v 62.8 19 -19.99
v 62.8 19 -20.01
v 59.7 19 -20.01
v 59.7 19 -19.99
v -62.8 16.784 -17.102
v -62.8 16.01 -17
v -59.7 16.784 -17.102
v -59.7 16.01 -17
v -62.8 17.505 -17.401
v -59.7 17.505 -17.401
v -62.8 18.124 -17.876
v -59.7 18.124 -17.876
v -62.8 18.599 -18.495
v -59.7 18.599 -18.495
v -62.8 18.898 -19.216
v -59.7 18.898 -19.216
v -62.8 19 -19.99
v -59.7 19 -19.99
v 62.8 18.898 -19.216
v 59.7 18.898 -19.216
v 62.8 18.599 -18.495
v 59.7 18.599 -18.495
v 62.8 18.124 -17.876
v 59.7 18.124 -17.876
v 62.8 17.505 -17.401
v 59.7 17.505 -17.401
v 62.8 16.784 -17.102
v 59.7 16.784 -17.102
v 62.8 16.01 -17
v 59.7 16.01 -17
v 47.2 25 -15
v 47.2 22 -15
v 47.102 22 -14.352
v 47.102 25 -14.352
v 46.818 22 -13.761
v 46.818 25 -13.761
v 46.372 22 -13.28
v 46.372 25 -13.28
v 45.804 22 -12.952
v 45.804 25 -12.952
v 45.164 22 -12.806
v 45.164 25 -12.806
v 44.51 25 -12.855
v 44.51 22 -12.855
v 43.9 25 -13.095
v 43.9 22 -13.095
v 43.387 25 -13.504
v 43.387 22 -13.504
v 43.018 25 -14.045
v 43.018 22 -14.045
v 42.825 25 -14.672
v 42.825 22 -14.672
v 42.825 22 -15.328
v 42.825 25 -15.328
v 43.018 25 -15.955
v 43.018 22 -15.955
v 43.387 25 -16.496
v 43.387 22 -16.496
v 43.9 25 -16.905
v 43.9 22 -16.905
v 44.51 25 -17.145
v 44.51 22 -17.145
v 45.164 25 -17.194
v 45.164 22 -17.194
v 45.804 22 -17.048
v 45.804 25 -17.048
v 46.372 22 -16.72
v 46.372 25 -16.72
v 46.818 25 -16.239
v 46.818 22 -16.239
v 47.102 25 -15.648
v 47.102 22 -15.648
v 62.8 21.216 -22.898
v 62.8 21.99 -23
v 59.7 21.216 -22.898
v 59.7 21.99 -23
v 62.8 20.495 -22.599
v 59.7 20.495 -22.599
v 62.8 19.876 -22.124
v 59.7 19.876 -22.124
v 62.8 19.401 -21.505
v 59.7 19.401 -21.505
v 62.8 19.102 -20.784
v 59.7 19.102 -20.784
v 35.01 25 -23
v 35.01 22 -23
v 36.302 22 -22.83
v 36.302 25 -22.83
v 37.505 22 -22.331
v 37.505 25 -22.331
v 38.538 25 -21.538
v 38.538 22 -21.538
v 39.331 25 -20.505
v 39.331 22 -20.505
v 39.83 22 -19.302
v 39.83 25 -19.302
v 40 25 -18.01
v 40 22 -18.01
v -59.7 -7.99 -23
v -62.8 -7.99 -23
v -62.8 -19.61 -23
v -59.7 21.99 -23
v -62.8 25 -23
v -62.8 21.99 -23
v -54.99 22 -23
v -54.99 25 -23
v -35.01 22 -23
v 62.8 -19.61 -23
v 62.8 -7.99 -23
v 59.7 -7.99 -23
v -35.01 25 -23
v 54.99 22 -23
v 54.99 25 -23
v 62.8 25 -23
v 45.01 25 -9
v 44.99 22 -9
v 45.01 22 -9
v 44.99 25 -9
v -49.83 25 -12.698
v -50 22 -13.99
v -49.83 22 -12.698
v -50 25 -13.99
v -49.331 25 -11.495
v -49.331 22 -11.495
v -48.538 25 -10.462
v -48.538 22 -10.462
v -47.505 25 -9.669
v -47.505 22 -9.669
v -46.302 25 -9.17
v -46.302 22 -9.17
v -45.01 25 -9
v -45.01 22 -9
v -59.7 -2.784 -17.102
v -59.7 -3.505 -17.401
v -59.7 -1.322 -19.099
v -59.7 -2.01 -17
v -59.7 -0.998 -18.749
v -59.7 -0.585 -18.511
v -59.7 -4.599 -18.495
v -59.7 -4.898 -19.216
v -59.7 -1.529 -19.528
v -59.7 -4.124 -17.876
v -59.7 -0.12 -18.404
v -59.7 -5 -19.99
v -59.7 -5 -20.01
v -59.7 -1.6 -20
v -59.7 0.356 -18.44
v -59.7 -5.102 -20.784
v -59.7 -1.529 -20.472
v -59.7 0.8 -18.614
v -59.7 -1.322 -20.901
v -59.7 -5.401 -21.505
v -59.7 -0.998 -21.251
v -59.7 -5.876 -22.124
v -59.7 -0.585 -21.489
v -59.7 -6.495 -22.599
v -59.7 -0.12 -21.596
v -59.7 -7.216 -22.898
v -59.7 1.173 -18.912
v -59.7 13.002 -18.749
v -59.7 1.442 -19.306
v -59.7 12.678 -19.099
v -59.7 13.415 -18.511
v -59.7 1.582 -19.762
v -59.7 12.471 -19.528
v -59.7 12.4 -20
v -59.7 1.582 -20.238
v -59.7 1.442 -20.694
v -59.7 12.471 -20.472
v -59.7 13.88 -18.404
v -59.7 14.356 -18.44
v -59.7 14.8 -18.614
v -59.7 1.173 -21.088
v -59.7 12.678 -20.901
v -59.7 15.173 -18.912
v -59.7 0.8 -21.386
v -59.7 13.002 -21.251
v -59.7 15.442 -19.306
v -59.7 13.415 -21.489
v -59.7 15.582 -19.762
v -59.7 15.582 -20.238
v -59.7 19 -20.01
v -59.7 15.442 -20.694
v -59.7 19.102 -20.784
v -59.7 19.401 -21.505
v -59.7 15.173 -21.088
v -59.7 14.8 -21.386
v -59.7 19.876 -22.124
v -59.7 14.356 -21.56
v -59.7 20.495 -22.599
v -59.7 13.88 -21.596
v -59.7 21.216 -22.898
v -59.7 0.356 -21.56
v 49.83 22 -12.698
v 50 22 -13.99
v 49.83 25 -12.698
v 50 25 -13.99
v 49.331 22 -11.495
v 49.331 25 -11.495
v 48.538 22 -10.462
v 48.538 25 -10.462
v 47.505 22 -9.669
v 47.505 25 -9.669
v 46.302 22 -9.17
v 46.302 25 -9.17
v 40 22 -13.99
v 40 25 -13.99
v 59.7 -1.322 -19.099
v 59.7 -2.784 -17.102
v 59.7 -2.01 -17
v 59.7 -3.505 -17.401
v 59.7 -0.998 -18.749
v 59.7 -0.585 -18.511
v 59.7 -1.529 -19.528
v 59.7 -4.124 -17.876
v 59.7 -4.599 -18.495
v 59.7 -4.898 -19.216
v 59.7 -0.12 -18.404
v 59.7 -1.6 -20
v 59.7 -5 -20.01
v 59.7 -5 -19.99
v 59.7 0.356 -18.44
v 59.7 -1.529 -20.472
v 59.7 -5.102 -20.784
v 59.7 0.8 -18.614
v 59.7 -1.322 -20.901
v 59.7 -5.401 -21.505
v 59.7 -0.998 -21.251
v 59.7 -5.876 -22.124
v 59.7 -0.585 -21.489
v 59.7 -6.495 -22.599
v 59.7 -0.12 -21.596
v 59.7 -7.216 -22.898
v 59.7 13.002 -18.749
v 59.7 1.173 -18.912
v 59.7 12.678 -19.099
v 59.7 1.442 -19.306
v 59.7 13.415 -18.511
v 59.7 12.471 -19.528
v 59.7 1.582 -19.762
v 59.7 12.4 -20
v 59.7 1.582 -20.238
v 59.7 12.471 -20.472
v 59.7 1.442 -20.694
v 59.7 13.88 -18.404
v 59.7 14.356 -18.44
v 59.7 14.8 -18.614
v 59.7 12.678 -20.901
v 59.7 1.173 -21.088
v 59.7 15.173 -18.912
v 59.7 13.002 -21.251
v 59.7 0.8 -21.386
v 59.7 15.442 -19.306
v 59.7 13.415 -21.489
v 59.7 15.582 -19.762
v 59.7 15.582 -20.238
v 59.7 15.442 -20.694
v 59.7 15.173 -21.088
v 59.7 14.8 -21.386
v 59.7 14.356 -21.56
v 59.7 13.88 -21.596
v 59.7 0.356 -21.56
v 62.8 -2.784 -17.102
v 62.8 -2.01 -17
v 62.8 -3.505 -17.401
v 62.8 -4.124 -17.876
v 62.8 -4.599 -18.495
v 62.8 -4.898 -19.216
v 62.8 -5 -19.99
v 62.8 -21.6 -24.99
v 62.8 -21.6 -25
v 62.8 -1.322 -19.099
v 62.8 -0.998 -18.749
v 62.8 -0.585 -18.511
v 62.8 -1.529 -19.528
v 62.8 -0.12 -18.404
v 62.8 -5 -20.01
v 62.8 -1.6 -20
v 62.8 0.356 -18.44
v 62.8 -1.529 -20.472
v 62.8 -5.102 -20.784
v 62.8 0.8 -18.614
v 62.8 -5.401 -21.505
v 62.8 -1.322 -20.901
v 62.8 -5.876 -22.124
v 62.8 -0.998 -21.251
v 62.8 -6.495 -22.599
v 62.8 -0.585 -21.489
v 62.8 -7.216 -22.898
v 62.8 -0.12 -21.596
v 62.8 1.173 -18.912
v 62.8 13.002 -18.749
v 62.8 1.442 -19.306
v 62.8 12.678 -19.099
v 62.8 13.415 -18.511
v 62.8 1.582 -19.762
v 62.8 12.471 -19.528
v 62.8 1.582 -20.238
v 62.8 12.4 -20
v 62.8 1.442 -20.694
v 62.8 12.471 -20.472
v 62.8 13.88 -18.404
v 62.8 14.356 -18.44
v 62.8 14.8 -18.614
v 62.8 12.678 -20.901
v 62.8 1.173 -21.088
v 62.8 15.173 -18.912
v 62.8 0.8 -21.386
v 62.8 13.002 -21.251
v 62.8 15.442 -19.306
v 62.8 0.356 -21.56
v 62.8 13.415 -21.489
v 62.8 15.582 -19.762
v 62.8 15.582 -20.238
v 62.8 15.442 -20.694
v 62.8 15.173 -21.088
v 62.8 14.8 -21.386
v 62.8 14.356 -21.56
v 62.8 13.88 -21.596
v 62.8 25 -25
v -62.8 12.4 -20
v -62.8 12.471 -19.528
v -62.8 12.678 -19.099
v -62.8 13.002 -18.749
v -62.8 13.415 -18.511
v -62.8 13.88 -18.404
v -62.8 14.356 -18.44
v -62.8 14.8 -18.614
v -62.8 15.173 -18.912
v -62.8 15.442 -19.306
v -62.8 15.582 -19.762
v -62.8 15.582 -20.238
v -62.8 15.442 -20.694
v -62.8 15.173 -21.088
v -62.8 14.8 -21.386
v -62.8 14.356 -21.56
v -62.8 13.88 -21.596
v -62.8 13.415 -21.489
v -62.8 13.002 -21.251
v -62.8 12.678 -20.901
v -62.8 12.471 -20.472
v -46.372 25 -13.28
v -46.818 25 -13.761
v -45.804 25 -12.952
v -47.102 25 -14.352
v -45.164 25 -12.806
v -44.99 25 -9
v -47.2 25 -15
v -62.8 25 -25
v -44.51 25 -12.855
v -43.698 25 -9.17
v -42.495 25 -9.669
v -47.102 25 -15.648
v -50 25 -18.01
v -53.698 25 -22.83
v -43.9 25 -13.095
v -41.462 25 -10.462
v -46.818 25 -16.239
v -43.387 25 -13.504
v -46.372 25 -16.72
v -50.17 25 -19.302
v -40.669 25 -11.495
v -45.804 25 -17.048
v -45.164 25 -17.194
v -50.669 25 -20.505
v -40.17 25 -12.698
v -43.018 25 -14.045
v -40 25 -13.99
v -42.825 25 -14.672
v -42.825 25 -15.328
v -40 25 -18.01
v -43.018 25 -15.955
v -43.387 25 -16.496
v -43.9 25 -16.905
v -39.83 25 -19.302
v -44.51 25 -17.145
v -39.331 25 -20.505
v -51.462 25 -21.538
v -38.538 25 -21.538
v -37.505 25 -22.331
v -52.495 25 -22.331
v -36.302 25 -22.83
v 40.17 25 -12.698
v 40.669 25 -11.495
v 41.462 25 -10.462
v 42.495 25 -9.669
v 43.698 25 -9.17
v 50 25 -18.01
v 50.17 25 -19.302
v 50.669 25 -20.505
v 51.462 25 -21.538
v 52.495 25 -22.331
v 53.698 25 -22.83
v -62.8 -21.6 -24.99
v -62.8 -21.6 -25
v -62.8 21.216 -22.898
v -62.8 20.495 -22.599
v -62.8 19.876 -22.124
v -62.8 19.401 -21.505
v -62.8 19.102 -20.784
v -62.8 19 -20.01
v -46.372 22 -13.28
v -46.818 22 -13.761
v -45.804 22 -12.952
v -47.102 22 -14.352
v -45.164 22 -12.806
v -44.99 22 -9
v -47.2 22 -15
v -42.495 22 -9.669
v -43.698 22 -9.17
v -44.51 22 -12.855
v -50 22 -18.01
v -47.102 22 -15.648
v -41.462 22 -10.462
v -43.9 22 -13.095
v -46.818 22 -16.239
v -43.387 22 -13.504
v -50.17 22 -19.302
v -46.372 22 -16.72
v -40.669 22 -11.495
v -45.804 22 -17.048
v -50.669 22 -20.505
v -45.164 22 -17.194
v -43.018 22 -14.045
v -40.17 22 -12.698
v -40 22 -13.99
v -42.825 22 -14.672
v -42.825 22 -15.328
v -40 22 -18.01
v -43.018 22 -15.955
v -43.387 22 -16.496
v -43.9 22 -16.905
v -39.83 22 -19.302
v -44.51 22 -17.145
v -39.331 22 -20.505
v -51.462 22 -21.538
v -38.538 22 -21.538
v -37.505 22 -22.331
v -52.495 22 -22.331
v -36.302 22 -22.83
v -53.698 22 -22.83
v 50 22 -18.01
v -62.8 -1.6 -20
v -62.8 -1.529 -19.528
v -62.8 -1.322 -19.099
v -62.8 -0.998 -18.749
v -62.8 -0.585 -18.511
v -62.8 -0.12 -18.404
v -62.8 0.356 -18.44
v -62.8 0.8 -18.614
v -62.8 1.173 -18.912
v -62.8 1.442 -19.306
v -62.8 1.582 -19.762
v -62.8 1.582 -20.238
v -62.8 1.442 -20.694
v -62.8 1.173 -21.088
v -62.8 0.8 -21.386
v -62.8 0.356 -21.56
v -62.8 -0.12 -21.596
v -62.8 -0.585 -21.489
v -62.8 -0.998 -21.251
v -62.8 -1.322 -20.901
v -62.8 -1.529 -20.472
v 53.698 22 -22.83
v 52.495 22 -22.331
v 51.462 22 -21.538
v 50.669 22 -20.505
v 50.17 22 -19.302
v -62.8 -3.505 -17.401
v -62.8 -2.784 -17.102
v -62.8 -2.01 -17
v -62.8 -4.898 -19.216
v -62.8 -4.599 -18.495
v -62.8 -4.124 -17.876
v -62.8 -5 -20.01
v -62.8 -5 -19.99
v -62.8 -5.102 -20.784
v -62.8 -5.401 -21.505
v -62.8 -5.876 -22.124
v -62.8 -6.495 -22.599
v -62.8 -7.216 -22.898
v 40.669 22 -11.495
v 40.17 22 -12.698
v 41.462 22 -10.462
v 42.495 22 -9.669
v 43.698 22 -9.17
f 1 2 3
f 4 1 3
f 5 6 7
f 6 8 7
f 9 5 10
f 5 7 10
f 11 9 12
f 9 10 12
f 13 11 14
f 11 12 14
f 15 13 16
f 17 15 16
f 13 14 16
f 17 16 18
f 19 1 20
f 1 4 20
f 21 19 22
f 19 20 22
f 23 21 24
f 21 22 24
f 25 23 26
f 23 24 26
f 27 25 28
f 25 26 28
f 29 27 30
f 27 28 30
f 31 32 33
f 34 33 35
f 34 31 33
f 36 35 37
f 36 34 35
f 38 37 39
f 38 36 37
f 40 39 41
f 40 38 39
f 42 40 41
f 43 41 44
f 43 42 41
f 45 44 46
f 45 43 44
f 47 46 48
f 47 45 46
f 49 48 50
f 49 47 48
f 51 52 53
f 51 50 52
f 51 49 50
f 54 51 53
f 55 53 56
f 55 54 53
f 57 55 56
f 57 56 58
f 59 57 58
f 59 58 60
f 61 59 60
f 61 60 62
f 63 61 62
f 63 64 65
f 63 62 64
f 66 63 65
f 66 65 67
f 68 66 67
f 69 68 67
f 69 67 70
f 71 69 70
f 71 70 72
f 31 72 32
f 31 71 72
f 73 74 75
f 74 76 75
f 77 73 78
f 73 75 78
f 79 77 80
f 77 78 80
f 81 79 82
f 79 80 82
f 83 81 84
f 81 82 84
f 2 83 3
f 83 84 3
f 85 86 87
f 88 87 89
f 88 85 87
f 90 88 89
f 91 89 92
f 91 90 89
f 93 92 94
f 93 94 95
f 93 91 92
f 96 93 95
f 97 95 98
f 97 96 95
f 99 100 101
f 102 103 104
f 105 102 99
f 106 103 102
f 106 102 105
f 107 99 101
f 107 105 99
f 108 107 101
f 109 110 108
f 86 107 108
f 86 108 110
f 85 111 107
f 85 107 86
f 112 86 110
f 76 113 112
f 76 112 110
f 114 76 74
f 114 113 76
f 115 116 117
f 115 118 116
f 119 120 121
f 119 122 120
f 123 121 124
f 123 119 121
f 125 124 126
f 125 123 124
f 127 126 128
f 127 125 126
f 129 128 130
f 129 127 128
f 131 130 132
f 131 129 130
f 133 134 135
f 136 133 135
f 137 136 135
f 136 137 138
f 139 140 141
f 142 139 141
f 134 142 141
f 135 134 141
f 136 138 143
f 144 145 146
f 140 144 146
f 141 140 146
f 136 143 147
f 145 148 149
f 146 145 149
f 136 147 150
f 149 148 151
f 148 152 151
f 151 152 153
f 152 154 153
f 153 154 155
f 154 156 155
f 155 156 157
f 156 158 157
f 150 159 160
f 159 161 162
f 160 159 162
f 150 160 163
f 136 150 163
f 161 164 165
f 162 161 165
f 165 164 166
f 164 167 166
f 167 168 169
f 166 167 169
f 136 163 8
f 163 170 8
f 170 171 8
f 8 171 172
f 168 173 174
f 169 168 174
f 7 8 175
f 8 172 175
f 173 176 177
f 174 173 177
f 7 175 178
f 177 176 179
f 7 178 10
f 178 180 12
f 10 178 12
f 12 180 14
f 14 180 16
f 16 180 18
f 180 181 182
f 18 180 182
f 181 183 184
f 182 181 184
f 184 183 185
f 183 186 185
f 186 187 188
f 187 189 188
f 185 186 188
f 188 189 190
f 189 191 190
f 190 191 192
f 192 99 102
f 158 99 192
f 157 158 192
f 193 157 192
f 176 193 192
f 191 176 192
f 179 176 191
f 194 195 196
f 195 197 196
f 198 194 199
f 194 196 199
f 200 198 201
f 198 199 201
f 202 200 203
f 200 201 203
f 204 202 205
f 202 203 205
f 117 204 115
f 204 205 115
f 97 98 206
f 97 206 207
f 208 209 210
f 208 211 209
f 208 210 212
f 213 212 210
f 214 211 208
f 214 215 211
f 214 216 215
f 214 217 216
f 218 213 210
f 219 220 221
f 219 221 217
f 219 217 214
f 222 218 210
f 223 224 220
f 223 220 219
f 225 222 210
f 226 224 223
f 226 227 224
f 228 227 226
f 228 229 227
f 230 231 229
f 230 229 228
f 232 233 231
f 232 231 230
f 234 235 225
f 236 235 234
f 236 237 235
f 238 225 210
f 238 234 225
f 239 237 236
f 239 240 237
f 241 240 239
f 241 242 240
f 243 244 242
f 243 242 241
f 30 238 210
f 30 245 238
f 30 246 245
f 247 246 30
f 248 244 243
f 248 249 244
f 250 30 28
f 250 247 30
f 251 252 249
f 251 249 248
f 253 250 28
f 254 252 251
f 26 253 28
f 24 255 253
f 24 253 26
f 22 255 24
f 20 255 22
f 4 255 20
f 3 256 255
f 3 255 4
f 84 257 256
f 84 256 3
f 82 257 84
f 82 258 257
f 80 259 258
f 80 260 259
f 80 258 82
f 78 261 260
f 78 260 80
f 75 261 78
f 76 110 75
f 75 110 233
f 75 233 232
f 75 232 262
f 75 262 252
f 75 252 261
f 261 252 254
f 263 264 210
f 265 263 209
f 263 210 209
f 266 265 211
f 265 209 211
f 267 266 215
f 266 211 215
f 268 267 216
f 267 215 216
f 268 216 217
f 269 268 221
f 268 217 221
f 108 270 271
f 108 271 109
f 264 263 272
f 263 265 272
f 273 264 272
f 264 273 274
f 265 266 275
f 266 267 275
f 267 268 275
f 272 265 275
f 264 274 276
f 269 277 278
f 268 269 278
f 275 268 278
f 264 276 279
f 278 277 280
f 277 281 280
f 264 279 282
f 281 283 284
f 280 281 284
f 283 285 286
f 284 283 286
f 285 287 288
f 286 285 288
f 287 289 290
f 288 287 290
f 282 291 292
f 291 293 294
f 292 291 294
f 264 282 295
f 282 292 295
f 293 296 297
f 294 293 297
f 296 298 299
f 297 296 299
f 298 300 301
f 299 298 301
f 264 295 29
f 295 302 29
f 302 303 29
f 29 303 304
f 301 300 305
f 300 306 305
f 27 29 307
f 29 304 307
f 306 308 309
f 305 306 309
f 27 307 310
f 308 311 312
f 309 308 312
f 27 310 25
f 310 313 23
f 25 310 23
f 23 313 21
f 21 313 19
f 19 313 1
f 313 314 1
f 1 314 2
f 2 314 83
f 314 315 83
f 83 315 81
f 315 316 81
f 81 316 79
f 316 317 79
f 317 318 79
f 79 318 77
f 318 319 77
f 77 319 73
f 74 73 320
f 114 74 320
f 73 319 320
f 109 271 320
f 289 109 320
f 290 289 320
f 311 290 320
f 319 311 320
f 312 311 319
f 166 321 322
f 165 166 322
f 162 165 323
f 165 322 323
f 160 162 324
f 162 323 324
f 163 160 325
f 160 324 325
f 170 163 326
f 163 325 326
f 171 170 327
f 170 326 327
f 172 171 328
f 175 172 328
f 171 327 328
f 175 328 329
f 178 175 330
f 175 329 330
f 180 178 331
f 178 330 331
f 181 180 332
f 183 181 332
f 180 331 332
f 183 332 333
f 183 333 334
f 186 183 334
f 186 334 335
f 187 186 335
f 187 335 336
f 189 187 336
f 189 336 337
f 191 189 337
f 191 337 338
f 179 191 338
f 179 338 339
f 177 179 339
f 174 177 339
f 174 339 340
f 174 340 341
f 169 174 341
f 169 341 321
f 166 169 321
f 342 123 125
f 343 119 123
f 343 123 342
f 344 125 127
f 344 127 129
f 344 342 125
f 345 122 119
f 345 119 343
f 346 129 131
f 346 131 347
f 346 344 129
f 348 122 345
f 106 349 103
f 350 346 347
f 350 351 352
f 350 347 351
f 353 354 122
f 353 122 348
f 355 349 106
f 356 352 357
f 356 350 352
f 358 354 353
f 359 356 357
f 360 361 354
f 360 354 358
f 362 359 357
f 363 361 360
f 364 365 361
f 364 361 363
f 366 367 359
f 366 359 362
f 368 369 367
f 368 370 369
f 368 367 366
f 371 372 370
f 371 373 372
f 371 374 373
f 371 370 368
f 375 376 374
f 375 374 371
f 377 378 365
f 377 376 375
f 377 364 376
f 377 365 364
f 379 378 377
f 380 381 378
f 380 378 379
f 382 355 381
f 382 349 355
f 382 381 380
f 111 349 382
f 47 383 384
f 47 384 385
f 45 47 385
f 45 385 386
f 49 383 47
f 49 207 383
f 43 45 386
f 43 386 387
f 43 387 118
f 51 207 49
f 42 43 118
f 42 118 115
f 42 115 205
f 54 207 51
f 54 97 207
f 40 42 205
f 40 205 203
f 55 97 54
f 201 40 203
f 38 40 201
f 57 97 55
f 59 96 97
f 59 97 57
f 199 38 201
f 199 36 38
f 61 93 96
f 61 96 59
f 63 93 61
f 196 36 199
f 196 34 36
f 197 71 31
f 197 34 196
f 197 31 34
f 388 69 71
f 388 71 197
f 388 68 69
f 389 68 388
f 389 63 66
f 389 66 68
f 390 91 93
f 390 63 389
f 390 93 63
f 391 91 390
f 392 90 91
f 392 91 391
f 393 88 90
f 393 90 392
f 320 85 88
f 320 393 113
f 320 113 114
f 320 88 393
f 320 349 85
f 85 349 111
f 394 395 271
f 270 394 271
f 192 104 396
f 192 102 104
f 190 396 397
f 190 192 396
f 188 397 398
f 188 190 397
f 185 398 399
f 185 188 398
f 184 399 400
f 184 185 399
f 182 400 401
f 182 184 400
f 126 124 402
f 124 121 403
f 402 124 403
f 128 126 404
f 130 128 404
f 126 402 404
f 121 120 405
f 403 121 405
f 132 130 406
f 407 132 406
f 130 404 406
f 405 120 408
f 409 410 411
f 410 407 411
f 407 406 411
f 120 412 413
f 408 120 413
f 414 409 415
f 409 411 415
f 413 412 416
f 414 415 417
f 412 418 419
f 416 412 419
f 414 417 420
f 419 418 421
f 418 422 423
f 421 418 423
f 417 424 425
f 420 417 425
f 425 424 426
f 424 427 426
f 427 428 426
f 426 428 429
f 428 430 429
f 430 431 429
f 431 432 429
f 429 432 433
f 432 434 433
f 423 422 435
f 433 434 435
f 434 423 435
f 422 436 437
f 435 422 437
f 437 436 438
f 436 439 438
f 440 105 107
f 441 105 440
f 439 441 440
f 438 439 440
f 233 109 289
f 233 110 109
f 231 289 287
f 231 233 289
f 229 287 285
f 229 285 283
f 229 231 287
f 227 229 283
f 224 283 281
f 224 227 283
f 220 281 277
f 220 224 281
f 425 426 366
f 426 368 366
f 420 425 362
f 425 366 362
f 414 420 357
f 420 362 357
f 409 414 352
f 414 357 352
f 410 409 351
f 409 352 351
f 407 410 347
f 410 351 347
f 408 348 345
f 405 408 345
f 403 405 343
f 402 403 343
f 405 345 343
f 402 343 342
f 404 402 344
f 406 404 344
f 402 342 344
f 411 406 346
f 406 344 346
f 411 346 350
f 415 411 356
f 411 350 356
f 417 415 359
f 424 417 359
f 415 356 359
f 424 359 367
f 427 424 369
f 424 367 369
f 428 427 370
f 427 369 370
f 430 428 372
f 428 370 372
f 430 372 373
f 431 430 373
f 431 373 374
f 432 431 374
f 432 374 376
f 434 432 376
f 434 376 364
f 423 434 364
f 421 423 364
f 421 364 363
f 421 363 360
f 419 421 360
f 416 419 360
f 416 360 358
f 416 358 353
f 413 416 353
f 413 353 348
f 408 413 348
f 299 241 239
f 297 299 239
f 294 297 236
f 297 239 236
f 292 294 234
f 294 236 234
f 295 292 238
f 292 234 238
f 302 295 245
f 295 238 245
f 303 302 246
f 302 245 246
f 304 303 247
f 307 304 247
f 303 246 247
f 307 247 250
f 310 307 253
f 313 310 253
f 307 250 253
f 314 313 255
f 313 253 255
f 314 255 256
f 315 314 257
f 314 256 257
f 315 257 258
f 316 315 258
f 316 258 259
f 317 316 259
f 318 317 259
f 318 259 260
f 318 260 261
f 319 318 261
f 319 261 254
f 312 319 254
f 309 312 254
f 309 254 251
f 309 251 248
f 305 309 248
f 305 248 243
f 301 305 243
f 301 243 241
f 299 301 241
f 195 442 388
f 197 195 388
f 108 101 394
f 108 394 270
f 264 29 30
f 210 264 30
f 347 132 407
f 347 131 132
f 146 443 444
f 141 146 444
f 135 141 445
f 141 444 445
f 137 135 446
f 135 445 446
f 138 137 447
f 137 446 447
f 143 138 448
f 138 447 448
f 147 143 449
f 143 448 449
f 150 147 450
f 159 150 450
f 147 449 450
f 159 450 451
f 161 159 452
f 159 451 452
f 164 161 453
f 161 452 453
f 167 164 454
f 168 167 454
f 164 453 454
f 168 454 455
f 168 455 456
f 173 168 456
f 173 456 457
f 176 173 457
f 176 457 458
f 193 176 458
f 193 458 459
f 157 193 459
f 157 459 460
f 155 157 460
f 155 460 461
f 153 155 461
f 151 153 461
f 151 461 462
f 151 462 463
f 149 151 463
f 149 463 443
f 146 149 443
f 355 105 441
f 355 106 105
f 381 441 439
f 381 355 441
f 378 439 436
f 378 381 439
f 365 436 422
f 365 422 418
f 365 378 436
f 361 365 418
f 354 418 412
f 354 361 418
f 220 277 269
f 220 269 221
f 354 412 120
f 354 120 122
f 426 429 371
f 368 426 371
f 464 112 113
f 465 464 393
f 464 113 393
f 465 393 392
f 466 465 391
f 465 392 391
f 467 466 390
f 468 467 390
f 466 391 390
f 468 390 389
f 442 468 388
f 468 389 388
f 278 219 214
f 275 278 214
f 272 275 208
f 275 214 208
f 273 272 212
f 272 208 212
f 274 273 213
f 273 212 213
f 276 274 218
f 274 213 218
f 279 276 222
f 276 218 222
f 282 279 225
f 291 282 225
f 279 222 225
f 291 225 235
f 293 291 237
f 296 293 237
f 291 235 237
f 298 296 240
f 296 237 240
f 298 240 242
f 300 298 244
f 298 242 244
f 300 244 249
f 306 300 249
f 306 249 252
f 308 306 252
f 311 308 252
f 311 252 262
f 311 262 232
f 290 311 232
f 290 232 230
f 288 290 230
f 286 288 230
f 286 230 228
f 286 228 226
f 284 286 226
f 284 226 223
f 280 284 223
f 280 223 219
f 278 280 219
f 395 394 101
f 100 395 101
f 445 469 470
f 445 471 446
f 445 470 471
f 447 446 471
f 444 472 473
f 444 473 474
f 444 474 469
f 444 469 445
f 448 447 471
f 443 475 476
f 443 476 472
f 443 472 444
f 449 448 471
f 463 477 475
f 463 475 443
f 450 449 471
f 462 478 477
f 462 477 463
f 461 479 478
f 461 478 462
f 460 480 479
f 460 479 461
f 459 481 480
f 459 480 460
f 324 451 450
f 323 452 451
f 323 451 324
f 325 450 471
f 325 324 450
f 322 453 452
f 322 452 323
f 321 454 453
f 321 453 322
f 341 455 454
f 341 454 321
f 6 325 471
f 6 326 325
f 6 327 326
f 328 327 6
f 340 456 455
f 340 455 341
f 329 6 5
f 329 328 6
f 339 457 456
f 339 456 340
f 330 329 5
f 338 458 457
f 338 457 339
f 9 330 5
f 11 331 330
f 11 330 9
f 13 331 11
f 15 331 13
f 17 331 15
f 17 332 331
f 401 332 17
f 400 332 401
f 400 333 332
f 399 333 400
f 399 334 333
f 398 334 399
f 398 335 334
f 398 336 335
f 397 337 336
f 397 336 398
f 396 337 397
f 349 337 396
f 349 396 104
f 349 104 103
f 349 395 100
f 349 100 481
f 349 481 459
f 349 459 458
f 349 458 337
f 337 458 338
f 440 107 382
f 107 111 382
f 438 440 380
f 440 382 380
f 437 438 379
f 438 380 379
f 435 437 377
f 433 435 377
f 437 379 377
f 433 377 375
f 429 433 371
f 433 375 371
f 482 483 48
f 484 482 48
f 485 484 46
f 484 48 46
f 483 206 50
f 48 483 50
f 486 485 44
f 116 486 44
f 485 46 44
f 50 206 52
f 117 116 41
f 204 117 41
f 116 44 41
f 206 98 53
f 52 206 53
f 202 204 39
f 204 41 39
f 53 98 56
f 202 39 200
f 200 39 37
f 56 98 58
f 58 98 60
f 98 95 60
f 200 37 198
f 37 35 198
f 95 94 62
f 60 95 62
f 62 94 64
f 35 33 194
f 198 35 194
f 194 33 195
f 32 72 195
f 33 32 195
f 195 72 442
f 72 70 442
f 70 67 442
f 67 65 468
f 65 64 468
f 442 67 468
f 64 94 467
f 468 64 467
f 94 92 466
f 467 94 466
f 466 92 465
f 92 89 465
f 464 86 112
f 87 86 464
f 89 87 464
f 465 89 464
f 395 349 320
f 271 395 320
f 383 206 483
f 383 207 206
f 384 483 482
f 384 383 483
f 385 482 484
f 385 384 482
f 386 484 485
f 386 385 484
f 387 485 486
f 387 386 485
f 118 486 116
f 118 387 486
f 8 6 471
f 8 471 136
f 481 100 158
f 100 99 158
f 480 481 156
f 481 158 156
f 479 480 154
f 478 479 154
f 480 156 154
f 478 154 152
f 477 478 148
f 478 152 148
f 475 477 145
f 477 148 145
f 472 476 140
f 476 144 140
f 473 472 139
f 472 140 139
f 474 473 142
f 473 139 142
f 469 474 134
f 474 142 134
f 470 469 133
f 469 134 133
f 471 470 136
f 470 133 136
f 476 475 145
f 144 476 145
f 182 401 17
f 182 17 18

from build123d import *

# Parameters (mm, degrees)
SKETCH013_W     = 125.6
SKETCH013_H     = 46.6
PAD007_DEPTH    = 2
CHAMFER_SIZE    = 1.99
SKETCH014_W     = 3.1
SKETCH014_H     = 24
PAD008_DEPTH    = 6
SKETCH015_R     = 1.6
POCKET002_DEPTH = 125.601
SKETCH016_W     = 10
SKETCH016_H     = 3
PAD009_DEPTH    = 14
SKETCH017_R     = 2.2
POCKET003_DEPTH = 5
FILLET001_R     = 4.99
FILLET002_R     = 2.99


with BuildPart() as part:
    # Sketch013 → Pad007 (new body)
    with BuildSketch(Plane.XY.offset(-25)):
        with Locations((0, 1.7)):
            Rectangle(SKETCH013_W, SKETCH013_H)
    extrude(amount=PAD007_DEPTH)

    # Chamfer
    chamfer_edges = [part.edges().sort_by_distance(p)[0] for p in [
        (0, -21.6, -23),
    ]]
    chamfer(chamfer_edges, length=CHAMFER_SIZE)

    # Sketch014 → Pad008 (new body)
    with BuildSketch(Plane.XY.offset(-23)):
        with Locations((-61.25, 7)):
            Rectangle(SKETCH014_W, SKETCH014_H)
    pad008 = extrude(amount=PAD008_DEPTH)

    # Mirrored: Pad008 across Sketch014 V_Axis
    add(pad008.mirror(Plane(origin=(0, 0, -23), x_dir=(0, 0, 1), z_dir=(1, 0, 0))))

    # Sketch015 → Pocket002 (cut, through all)
    with BuildSketch(Plane(origin=(-62.8, 0, -25), x_dir=(0, -1, 0), z_dir=(-1, 0, 0))):
        with Locations((0, 5)):
            Circle(SKETCH015_R)
        with Locations((-14, 5)):
            Circle(SKETCH015_R)
    extrude(amount=-POCKET002_DEPTH, mode=Mode.SUBTRACT)

    # Sketch016 → Pad009 (new body)
    with BuildSketch(Plane.XY.offset(-23)):
        with Locations((-45, 23.5)):
            Rectangle(SKETCH016_W, SKETCH016_H)
        with Locations((45, 23.5)):
            Rectangle(SKETCH016_W, SKETCH016_H)
    extrude(amount=PAD009_DEPTH)

    # Sketch017 → Pocket003 (cut)
    with BuildSketch(Plane(origin=(0, 25, -25), x_dir=(-1, 0, 0), z_dir=(0, 1, 0))):
        with Locations((45, 10)):
            Circle(SKETCH017_R)
    pocket003 = extrude(amount=-POCKET003_DEPTH, mode=Mode.SUBTRACT)

    # Mirrored001: Pocket003 across Sketch017 V_Axis
    add(pocket003.mirror(Plane(origin=(0, 25, -25), x_dir=(0, 1, 0), z_dir=(-1, 0, 0))), mode=Mode.SUBTRACT)

    # Fillet001
    fillet001_edges = [part.edges().sort_by_distance(p)[0] for p in [
        (50, 23.5, -23),
        (50, 23.5, -9),
        (40, 23.5, -9),
        (40, 23.5, -23),
        (-50, 23.5, -23),
        (-50, 23.5, -9),
        (-40, 23.5, -9),
        (-40, 23.5, -23),
    ]]
    fillet(fillet001_edges, radius=FILLET001_R)

    # Fillet002
    fillet002_edges = [part.edges().sort_by_distance(p)[0] for p in [
        (-61.25, 19, -23),
        (-61.25, 19, -17),
        (-61.25, -5, -23),
        (-61.25, -5, -17),
        (61.25, -5, -17),
        (61.25, -5, -23),
        (61.25, 19, -17),
        (61.25, 19, -23),
    ]]
    fillet(fillet002_edges, radius=FILLET002_R)


solid = part.part
